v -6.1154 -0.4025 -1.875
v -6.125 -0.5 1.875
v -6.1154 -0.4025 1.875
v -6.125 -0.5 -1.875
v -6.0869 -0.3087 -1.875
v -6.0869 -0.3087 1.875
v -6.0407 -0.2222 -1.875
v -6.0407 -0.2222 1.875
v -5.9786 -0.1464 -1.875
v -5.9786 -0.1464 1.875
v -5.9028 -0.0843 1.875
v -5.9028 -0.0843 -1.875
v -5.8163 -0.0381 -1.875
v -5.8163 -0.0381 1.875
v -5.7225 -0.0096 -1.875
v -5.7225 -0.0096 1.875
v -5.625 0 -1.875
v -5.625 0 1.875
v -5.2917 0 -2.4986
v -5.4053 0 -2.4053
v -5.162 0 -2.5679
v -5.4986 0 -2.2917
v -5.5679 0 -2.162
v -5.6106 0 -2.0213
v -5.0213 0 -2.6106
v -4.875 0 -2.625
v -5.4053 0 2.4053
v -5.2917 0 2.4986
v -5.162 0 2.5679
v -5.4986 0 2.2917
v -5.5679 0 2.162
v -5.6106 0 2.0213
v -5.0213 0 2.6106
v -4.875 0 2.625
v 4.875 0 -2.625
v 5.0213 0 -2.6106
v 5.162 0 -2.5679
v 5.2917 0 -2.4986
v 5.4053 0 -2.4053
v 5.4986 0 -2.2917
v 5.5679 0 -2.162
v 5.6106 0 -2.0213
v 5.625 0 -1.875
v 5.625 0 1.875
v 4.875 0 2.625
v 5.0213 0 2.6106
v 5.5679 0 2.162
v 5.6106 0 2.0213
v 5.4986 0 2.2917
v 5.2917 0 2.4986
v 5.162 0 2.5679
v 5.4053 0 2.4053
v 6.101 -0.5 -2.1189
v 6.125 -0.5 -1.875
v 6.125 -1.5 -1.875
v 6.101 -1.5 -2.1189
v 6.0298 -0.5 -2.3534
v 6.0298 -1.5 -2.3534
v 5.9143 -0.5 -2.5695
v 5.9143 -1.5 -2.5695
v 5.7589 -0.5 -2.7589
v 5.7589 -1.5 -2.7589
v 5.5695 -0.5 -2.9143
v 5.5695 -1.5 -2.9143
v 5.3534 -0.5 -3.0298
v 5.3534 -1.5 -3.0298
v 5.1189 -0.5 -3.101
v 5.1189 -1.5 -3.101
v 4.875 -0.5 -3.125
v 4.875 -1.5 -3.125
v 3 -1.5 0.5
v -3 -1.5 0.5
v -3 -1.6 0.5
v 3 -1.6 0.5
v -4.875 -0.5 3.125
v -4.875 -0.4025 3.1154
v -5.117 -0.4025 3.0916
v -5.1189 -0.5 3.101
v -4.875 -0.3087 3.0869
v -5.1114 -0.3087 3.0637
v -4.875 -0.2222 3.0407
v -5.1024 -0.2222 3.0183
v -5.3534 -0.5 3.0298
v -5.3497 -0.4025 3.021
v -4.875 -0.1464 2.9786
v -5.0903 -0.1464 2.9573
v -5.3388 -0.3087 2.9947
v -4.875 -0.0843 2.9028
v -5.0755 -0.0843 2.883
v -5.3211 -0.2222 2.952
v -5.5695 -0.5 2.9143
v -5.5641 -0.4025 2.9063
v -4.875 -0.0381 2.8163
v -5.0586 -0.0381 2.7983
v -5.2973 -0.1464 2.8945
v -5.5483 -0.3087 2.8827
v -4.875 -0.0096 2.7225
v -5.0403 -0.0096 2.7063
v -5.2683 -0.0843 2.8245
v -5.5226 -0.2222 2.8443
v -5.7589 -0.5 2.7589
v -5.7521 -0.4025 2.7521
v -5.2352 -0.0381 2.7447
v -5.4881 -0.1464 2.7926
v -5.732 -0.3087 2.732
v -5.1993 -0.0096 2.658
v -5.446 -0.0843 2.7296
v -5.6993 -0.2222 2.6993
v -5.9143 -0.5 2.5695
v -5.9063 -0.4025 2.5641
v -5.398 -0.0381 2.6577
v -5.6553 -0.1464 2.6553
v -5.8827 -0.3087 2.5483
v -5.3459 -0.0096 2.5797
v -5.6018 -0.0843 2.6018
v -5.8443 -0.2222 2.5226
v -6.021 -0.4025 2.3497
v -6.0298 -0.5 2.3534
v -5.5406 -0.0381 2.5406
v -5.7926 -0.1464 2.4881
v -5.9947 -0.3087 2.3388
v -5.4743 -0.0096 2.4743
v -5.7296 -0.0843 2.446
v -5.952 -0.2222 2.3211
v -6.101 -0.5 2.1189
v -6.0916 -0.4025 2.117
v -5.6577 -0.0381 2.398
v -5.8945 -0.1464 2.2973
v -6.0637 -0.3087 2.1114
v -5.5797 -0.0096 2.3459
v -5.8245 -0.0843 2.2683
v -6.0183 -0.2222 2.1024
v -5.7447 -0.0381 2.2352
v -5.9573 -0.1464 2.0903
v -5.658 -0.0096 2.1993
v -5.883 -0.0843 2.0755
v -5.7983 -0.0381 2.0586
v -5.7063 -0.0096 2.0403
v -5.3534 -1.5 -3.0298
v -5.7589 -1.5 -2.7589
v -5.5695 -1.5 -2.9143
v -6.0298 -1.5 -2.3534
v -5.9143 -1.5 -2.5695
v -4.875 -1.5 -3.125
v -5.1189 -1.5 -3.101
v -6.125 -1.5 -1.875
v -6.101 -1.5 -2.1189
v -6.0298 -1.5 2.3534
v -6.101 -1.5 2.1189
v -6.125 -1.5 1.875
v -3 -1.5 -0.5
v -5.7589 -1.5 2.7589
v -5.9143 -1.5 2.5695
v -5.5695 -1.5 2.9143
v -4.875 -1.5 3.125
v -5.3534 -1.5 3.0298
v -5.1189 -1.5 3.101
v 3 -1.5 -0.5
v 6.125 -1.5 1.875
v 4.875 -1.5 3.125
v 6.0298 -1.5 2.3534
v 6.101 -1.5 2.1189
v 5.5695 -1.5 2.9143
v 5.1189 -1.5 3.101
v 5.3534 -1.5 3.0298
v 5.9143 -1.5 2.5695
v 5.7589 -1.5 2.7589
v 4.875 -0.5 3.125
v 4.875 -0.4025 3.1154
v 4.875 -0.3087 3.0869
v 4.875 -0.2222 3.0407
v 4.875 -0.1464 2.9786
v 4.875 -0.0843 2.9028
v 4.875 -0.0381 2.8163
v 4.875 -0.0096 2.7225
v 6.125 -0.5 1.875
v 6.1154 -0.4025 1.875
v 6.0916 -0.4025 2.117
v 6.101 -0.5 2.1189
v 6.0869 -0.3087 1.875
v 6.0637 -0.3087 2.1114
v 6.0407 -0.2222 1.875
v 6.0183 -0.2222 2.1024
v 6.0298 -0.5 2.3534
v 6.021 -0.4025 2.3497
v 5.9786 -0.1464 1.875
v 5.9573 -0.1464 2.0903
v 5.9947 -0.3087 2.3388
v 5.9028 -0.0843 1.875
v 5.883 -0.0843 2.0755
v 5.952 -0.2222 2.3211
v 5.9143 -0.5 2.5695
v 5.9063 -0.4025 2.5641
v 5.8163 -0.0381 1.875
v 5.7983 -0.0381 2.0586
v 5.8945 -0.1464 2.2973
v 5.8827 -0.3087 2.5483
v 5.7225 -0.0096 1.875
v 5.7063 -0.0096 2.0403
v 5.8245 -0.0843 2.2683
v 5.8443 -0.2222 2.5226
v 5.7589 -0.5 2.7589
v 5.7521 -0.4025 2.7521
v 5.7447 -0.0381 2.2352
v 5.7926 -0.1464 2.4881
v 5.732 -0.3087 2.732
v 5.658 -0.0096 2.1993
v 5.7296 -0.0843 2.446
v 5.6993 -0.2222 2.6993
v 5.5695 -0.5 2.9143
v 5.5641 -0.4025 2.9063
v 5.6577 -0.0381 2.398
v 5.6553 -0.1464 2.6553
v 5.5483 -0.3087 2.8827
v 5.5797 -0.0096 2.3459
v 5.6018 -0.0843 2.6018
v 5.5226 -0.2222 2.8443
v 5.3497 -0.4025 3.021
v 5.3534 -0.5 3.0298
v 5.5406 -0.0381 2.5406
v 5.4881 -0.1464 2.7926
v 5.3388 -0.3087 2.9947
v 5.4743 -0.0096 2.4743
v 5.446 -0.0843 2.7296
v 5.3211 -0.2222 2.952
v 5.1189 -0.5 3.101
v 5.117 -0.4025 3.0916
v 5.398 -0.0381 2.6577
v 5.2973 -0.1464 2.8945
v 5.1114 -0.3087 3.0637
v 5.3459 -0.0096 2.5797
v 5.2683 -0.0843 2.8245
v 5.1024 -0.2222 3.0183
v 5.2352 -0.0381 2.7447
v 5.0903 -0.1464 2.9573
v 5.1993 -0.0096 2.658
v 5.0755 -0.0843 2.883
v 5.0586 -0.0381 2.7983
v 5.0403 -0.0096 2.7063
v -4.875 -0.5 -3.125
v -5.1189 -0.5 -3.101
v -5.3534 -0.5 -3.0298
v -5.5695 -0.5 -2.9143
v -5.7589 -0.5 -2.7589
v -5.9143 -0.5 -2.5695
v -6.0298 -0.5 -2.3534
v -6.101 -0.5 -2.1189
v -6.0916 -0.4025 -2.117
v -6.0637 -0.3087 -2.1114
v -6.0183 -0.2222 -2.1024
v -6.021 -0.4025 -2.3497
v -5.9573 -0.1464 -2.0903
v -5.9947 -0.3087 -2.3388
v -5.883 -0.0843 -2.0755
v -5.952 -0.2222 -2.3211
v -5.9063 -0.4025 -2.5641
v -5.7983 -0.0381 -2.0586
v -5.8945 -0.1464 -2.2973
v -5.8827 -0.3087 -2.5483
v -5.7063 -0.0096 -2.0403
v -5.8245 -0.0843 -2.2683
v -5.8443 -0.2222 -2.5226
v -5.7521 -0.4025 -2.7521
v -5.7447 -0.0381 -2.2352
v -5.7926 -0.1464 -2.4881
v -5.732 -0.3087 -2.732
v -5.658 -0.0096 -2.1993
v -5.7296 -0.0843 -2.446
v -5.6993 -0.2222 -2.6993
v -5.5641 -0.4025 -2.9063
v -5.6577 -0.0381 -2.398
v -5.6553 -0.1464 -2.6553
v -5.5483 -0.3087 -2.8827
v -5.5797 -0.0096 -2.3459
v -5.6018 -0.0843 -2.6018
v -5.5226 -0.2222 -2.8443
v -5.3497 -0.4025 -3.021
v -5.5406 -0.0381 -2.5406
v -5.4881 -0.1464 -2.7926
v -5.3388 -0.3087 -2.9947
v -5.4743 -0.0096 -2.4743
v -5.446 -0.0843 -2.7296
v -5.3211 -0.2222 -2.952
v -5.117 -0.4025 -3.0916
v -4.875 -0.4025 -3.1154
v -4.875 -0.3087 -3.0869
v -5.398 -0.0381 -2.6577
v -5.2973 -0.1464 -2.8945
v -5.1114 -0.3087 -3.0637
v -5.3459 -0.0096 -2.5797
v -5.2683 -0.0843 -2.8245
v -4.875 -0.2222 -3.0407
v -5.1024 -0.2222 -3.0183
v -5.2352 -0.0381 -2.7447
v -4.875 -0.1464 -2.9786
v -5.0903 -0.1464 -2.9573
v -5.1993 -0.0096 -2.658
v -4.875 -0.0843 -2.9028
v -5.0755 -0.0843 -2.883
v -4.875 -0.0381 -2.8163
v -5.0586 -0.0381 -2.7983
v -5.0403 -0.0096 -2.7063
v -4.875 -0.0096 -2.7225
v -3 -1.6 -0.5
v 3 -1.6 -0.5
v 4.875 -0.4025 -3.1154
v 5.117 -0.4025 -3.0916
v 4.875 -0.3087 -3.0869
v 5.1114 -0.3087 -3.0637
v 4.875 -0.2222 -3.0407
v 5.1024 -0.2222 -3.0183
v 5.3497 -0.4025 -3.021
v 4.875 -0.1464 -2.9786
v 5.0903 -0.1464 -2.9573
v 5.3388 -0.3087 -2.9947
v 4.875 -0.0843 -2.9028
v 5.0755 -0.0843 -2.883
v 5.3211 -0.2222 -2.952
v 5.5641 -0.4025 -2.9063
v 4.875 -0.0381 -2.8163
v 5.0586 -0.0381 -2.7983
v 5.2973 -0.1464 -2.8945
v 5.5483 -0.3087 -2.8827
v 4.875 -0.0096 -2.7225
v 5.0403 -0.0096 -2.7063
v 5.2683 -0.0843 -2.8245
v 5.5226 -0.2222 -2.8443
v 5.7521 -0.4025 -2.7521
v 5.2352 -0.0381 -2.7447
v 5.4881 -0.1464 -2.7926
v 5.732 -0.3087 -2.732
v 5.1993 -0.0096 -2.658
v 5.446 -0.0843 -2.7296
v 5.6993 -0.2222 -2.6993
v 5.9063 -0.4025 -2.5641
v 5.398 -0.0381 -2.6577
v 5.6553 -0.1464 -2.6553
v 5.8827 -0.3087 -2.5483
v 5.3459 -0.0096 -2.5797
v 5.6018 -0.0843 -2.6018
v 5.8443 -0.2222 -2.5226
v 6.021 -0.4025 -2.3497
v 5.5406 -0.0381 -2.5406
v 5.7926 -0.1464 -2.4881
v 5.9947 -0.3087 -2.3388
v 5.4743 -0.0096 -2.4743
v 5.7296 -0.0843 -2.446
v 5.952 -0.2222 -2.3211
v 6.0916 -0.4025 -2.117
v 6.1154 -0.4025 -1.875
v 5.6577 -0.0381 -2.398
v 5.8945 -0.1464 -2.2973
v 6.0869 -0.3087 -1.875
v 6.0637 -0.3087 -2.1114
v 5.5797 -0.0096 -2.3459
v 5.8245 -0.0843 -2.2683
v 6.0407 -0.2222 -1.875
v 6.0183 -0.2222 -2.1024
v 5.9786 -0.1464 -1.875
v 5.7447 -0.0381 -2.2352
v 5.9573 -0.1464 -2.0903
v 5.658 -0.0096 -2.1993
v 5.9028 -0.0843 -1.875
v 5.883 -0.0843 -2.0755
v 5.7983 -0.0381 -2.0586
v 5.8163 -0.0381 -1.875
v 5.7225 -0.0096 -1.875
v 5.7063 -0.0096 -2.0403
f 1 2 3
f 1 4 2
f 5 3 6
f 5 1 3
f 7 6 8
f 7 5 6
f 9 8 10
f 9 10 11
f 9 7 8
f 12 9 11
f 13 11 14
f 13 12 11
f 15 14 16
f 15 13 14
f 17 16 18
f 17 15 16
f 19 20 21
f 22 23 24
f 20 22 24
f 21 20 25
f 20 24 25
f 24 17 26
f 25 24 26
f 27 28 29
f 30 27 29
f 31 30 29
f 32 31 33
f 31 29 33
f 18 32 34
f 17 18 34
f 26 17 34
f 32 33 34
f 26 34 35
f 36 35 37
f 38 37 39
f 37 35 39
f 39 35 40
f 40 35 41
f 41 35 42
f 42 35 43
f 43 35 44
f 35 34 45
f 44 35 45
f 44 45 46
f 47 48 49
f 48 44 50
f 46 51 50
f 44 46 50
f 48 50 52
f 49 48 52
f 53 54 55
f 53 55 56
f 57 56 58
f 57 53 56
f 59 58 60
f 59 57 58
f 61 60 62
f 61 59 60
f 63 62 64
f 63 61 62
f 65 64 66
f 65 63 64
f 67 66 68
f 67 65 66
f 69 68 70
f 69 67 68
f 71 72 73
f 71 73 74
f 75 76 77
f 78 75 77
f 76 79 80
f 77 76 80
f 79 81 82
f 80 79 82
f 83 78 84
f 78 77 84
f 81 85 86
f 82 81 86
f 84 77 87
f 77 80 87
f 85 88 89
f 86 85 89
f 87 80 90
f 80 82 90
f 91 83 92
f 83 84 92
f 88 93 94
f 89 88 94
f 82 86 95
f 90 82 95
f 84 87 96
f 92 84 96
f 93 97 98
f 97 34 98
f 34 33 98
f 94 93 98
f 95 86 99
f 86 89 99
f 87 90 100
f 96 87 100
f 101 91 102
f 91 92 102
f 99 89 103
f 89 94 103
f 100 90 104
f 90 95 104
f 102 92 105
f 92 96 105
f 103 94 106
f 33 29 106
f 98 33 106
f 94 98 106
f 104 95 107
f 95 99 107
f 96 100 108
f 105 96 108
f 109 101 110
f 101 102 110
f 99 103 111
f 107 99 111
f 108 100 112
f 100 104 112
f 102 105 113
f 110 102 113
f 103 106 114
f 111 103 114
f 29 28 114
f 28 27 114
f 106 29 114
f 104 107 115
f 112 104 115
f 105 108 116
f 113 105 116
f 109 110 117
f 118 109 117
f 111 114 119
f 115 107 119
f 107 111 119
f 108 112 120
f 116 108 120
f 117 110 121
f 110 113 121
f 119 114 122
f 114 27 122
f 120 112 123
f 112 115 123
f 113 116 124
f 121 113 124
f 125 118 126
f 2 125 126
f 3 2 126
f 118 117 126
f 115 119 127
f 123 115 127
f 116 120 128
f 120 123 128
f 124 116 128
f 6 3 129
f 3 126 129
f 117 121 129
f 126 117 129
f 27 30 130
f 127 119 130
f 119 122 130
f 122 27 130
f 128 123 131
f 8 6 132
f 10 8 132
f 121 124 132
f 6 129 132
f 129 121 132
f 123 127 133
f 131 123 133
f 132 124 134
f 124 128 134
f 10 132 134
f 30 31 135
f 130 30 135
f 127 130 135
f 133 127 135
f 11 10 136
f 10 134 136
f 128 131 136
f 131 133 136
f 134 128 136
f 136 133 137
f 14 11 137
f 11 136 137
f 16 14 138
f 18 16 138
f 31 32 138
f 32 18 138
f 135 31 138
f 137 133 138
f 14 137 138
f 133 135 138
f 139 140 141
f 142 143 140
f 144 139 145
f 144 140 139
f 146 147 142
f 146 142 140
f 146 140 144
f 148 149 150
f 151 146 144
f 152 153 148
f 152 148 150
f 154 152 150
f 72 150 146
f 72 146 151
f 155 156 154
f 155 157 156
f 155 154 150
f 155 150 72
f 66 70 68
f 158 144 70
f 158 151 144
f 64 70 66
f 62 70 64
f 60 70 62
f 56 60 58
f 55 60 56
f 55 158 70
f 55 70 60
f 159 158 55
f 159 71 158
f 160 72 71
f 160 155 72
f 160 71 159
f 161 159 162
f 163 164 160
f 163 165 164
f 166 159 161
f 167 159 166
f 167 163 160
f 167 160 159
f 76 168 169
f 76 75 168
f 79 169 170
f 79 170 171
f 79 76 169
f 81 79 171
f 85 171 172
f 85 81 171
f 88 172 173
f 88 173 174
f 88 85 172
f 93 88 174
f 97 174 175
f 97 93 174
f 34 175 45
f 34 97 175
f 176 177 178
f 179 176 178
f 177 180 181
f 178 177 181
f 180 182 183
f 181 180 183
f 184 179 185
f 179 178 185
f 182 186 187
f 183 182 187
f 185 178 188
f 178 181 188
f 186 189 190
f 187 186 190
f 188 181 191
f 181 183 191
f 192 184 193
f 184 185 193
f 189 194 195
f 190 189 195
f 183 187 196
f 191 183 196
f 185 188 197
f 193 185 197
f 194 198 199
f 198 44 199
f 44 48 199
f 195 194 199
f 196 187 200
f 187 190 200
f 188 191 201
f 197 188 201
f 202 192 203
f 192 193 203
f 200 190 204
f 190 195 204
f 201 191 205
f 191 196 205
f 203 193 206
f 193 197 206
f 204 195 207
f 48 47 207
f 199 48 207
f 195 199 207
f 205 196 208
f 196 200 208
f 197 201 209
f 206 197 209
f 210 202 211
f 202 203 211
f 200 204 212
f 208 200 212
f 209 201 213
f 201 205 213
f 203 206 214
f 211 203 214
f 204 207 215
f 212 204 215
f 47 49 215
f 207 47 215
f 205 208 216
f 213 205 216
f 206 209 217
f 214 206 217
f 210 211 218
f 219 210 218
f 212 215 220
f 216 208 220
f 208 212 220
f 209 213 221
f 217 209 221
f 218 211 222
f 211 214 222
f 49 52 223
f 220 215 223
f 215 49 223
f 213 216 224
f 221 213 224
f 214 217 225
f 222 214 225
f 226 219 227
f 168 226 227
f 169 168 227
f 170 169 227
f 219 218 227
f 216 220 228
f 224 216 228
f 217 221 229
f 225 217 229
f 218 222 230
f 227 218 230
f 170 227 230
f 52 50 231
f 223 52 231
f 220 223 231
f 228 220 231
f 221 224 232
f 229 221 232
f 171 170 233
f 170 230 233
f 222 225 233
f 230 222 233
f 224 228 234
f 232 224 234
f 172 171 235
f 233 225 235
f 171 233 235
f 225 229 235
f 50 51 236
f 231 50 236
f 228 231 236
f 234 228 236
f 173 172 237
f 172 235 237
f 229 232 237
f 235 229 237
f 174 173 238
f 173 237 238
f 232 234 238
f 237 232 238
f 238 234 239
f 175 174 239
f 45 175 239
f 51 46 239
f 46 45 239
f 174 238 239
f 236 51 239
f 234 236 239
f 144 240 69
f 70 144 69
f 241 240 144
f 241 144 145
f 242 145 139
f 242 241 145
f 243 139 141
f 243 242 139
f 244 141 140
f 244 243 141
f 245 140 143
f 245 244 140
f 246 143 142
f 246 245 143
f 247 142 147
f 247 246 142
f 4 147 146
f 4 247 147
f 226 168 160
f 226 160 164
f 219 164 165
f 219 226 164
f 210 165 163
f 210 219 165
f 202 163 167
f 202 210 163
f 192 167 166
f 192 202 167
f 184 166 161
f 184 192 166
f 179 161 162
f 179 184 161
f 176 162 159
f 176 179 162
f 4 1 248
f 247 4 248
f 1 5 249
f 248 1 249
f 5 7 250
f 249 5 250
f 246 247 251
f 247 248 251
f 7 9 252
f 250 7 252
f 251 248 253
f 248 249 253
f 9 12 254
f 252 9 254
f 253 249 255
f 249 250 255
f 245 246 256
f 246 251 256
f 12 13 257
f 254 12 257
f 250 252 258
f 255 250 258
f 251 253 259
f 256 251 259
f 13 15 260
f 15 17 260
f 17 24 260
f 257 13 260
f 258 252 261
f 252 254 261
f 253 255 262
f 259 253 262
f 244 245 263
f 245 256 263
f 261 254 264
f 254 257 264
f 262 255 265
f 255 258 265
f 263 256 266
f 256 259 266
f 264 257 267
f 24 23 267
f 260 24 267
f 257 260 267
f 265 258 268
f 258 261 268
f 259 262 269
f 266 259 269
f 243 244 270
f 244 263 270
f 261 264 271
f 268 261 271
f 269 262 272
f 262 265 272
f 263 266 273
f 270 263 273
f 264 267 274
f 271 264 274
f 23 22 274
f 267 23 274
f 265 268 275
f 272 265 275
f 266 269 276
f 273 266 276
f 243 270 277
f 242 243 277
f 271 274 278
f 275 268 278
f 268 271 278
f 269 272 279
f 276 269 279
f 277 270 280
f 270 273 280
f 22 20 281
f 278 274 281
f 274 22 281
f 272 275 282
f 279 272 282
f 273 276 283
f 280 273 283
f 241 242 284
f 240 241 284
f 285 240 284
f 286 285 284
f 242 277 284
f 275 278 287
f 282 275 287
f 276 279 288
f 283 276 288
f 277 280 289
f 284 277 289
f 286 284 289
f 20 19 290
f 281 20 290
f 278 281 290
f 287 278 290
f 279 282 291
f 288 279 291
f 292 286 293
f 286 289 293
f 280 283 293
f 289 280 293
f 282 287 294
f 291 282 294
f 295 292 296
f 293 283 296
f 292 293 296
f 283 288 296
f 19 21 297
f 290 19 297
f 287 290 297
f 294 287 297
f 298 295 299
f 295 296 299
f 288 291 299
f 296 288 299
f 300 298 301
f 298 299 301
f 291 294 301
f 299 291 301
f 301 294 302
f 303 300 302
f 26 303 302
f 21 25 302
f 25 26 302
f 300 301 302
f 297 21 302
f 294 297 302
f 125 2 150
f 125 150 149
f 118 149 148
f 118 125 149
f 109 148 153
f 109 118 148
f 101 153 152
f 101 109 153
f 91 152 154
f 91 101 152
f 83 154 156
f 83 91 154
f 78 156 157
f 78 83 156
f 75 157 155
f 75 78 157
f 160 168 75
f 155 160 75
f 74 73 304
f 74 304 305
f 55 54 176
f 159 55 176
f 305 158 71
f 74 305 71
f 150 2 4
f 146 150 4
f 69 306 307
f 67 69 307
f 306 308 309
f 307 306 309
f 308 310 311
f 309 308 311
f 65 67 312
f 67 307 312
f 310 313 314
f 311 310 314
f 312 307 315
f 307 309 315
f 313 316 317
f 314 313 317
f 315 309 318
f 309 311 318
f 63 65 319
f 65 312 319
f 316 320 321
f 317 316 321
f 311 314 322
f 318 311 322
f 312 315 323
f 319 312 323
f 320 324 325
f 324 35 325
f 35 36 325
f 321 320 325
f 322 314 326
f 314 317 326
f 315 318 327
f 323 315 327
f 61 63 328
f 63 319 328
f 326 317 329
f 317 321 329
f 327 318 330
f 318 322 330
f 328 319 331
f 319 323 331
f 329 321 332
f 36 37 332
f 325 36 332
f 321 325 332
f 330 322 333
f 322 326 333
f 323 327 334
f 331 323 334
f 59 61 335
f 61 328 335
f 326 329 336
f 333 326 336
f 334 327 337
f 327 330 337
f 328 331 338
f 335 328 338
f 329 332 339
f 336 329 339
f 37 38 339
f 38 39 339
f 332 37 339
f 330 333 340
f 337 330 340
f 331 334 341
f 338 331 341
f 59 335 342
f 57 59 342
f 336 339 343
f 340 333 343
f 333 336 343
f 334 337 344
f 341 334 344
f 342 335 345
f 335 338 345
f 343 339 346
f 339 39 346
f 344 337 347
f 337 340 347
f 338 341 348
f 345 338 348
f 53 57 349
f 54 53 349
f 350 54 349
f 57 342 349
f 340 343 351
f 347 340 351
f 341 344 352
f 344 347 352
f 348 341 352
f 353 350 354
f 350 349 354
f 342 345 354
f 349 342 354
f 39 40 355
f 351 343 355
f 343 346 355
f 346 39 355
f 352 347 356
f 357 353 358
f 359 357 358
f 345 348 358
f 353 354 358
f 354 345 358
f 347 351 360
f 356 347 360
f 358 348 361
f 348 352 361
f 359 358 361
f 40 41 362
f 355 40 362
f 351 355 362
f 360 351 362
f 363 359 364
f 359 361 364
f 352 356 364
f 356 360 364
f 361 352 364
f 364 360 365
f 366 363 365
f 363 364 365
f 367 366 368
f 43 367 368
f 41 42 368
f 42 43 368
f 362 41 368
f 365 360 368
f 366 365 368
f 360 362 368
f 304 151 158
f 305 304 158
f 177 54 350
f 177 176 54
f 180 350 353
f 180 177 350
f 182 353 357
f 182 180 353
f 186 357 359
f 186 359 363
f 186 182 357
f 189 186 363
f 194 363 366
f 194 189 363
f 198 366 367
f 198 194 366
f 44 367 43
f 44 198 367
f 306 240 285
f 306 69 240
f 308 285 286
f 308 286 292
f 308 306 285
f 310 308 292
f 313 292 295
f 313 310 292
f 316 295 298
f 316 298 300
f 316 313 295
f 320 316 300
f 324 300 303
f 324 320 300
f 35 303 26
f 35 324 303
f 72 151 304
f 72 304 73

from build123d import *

# Parameters (mm, degrees)
PAD003_DEPTH = 1.5
FILLET011_R  = 0.5
SKETCH023_W  = 6
SKETCH023_H  = 1
PAD004_DEPTH = 0.1


with BuildPart() as part:
    # Sketch020 → Pad003 (new body)
    with BuildSketch(Plane.XZ):
        with BuildLine():
            Line((-6.125, 1.875), (-6.125, -1.875))
            ThreePointArc((-4.875, -3.125), (-5.758883, -2.758883), (-6.125, -1.875))
            Line((-4.875, -3.125), (4.875, -3.125))
            ThreePointArc((6.125, -1.875), (5.758883, -2.758883), (4.875, -3.125))
            Line((6.125, -1.875), (6.125, 1.875))
            ThreePointArc((4.875, 3.125), (5.758883, 2.758883), (6.125, 1.875))
            Line((4.875, 3.125), (-4.875, 3.125))
            ThreePointArc((-6.125, 1.875), (-5.758883, 2.758883), (-4.875, 3.125))
        make_face()
    extrude(amount=PAD003_DEPTH)

    # Fillet011
    fillet011_edges = [part.edges().sort_by_distance(p)[0] for p in [
        (0, 0, -3.125),
    ]]
    fillet(fillet011_edges, radius=FILLET011_R)

    # Sketch023 (on Face4 of Fillet011) → Pad004 (join)
    with BuildSketch(Plane.XZ.offset(1.5)):
        Rectangle(SKETCH023_W, SKETCH023_H)
    extrude(amount=PAD004_DEPTH)


solid = part.part
